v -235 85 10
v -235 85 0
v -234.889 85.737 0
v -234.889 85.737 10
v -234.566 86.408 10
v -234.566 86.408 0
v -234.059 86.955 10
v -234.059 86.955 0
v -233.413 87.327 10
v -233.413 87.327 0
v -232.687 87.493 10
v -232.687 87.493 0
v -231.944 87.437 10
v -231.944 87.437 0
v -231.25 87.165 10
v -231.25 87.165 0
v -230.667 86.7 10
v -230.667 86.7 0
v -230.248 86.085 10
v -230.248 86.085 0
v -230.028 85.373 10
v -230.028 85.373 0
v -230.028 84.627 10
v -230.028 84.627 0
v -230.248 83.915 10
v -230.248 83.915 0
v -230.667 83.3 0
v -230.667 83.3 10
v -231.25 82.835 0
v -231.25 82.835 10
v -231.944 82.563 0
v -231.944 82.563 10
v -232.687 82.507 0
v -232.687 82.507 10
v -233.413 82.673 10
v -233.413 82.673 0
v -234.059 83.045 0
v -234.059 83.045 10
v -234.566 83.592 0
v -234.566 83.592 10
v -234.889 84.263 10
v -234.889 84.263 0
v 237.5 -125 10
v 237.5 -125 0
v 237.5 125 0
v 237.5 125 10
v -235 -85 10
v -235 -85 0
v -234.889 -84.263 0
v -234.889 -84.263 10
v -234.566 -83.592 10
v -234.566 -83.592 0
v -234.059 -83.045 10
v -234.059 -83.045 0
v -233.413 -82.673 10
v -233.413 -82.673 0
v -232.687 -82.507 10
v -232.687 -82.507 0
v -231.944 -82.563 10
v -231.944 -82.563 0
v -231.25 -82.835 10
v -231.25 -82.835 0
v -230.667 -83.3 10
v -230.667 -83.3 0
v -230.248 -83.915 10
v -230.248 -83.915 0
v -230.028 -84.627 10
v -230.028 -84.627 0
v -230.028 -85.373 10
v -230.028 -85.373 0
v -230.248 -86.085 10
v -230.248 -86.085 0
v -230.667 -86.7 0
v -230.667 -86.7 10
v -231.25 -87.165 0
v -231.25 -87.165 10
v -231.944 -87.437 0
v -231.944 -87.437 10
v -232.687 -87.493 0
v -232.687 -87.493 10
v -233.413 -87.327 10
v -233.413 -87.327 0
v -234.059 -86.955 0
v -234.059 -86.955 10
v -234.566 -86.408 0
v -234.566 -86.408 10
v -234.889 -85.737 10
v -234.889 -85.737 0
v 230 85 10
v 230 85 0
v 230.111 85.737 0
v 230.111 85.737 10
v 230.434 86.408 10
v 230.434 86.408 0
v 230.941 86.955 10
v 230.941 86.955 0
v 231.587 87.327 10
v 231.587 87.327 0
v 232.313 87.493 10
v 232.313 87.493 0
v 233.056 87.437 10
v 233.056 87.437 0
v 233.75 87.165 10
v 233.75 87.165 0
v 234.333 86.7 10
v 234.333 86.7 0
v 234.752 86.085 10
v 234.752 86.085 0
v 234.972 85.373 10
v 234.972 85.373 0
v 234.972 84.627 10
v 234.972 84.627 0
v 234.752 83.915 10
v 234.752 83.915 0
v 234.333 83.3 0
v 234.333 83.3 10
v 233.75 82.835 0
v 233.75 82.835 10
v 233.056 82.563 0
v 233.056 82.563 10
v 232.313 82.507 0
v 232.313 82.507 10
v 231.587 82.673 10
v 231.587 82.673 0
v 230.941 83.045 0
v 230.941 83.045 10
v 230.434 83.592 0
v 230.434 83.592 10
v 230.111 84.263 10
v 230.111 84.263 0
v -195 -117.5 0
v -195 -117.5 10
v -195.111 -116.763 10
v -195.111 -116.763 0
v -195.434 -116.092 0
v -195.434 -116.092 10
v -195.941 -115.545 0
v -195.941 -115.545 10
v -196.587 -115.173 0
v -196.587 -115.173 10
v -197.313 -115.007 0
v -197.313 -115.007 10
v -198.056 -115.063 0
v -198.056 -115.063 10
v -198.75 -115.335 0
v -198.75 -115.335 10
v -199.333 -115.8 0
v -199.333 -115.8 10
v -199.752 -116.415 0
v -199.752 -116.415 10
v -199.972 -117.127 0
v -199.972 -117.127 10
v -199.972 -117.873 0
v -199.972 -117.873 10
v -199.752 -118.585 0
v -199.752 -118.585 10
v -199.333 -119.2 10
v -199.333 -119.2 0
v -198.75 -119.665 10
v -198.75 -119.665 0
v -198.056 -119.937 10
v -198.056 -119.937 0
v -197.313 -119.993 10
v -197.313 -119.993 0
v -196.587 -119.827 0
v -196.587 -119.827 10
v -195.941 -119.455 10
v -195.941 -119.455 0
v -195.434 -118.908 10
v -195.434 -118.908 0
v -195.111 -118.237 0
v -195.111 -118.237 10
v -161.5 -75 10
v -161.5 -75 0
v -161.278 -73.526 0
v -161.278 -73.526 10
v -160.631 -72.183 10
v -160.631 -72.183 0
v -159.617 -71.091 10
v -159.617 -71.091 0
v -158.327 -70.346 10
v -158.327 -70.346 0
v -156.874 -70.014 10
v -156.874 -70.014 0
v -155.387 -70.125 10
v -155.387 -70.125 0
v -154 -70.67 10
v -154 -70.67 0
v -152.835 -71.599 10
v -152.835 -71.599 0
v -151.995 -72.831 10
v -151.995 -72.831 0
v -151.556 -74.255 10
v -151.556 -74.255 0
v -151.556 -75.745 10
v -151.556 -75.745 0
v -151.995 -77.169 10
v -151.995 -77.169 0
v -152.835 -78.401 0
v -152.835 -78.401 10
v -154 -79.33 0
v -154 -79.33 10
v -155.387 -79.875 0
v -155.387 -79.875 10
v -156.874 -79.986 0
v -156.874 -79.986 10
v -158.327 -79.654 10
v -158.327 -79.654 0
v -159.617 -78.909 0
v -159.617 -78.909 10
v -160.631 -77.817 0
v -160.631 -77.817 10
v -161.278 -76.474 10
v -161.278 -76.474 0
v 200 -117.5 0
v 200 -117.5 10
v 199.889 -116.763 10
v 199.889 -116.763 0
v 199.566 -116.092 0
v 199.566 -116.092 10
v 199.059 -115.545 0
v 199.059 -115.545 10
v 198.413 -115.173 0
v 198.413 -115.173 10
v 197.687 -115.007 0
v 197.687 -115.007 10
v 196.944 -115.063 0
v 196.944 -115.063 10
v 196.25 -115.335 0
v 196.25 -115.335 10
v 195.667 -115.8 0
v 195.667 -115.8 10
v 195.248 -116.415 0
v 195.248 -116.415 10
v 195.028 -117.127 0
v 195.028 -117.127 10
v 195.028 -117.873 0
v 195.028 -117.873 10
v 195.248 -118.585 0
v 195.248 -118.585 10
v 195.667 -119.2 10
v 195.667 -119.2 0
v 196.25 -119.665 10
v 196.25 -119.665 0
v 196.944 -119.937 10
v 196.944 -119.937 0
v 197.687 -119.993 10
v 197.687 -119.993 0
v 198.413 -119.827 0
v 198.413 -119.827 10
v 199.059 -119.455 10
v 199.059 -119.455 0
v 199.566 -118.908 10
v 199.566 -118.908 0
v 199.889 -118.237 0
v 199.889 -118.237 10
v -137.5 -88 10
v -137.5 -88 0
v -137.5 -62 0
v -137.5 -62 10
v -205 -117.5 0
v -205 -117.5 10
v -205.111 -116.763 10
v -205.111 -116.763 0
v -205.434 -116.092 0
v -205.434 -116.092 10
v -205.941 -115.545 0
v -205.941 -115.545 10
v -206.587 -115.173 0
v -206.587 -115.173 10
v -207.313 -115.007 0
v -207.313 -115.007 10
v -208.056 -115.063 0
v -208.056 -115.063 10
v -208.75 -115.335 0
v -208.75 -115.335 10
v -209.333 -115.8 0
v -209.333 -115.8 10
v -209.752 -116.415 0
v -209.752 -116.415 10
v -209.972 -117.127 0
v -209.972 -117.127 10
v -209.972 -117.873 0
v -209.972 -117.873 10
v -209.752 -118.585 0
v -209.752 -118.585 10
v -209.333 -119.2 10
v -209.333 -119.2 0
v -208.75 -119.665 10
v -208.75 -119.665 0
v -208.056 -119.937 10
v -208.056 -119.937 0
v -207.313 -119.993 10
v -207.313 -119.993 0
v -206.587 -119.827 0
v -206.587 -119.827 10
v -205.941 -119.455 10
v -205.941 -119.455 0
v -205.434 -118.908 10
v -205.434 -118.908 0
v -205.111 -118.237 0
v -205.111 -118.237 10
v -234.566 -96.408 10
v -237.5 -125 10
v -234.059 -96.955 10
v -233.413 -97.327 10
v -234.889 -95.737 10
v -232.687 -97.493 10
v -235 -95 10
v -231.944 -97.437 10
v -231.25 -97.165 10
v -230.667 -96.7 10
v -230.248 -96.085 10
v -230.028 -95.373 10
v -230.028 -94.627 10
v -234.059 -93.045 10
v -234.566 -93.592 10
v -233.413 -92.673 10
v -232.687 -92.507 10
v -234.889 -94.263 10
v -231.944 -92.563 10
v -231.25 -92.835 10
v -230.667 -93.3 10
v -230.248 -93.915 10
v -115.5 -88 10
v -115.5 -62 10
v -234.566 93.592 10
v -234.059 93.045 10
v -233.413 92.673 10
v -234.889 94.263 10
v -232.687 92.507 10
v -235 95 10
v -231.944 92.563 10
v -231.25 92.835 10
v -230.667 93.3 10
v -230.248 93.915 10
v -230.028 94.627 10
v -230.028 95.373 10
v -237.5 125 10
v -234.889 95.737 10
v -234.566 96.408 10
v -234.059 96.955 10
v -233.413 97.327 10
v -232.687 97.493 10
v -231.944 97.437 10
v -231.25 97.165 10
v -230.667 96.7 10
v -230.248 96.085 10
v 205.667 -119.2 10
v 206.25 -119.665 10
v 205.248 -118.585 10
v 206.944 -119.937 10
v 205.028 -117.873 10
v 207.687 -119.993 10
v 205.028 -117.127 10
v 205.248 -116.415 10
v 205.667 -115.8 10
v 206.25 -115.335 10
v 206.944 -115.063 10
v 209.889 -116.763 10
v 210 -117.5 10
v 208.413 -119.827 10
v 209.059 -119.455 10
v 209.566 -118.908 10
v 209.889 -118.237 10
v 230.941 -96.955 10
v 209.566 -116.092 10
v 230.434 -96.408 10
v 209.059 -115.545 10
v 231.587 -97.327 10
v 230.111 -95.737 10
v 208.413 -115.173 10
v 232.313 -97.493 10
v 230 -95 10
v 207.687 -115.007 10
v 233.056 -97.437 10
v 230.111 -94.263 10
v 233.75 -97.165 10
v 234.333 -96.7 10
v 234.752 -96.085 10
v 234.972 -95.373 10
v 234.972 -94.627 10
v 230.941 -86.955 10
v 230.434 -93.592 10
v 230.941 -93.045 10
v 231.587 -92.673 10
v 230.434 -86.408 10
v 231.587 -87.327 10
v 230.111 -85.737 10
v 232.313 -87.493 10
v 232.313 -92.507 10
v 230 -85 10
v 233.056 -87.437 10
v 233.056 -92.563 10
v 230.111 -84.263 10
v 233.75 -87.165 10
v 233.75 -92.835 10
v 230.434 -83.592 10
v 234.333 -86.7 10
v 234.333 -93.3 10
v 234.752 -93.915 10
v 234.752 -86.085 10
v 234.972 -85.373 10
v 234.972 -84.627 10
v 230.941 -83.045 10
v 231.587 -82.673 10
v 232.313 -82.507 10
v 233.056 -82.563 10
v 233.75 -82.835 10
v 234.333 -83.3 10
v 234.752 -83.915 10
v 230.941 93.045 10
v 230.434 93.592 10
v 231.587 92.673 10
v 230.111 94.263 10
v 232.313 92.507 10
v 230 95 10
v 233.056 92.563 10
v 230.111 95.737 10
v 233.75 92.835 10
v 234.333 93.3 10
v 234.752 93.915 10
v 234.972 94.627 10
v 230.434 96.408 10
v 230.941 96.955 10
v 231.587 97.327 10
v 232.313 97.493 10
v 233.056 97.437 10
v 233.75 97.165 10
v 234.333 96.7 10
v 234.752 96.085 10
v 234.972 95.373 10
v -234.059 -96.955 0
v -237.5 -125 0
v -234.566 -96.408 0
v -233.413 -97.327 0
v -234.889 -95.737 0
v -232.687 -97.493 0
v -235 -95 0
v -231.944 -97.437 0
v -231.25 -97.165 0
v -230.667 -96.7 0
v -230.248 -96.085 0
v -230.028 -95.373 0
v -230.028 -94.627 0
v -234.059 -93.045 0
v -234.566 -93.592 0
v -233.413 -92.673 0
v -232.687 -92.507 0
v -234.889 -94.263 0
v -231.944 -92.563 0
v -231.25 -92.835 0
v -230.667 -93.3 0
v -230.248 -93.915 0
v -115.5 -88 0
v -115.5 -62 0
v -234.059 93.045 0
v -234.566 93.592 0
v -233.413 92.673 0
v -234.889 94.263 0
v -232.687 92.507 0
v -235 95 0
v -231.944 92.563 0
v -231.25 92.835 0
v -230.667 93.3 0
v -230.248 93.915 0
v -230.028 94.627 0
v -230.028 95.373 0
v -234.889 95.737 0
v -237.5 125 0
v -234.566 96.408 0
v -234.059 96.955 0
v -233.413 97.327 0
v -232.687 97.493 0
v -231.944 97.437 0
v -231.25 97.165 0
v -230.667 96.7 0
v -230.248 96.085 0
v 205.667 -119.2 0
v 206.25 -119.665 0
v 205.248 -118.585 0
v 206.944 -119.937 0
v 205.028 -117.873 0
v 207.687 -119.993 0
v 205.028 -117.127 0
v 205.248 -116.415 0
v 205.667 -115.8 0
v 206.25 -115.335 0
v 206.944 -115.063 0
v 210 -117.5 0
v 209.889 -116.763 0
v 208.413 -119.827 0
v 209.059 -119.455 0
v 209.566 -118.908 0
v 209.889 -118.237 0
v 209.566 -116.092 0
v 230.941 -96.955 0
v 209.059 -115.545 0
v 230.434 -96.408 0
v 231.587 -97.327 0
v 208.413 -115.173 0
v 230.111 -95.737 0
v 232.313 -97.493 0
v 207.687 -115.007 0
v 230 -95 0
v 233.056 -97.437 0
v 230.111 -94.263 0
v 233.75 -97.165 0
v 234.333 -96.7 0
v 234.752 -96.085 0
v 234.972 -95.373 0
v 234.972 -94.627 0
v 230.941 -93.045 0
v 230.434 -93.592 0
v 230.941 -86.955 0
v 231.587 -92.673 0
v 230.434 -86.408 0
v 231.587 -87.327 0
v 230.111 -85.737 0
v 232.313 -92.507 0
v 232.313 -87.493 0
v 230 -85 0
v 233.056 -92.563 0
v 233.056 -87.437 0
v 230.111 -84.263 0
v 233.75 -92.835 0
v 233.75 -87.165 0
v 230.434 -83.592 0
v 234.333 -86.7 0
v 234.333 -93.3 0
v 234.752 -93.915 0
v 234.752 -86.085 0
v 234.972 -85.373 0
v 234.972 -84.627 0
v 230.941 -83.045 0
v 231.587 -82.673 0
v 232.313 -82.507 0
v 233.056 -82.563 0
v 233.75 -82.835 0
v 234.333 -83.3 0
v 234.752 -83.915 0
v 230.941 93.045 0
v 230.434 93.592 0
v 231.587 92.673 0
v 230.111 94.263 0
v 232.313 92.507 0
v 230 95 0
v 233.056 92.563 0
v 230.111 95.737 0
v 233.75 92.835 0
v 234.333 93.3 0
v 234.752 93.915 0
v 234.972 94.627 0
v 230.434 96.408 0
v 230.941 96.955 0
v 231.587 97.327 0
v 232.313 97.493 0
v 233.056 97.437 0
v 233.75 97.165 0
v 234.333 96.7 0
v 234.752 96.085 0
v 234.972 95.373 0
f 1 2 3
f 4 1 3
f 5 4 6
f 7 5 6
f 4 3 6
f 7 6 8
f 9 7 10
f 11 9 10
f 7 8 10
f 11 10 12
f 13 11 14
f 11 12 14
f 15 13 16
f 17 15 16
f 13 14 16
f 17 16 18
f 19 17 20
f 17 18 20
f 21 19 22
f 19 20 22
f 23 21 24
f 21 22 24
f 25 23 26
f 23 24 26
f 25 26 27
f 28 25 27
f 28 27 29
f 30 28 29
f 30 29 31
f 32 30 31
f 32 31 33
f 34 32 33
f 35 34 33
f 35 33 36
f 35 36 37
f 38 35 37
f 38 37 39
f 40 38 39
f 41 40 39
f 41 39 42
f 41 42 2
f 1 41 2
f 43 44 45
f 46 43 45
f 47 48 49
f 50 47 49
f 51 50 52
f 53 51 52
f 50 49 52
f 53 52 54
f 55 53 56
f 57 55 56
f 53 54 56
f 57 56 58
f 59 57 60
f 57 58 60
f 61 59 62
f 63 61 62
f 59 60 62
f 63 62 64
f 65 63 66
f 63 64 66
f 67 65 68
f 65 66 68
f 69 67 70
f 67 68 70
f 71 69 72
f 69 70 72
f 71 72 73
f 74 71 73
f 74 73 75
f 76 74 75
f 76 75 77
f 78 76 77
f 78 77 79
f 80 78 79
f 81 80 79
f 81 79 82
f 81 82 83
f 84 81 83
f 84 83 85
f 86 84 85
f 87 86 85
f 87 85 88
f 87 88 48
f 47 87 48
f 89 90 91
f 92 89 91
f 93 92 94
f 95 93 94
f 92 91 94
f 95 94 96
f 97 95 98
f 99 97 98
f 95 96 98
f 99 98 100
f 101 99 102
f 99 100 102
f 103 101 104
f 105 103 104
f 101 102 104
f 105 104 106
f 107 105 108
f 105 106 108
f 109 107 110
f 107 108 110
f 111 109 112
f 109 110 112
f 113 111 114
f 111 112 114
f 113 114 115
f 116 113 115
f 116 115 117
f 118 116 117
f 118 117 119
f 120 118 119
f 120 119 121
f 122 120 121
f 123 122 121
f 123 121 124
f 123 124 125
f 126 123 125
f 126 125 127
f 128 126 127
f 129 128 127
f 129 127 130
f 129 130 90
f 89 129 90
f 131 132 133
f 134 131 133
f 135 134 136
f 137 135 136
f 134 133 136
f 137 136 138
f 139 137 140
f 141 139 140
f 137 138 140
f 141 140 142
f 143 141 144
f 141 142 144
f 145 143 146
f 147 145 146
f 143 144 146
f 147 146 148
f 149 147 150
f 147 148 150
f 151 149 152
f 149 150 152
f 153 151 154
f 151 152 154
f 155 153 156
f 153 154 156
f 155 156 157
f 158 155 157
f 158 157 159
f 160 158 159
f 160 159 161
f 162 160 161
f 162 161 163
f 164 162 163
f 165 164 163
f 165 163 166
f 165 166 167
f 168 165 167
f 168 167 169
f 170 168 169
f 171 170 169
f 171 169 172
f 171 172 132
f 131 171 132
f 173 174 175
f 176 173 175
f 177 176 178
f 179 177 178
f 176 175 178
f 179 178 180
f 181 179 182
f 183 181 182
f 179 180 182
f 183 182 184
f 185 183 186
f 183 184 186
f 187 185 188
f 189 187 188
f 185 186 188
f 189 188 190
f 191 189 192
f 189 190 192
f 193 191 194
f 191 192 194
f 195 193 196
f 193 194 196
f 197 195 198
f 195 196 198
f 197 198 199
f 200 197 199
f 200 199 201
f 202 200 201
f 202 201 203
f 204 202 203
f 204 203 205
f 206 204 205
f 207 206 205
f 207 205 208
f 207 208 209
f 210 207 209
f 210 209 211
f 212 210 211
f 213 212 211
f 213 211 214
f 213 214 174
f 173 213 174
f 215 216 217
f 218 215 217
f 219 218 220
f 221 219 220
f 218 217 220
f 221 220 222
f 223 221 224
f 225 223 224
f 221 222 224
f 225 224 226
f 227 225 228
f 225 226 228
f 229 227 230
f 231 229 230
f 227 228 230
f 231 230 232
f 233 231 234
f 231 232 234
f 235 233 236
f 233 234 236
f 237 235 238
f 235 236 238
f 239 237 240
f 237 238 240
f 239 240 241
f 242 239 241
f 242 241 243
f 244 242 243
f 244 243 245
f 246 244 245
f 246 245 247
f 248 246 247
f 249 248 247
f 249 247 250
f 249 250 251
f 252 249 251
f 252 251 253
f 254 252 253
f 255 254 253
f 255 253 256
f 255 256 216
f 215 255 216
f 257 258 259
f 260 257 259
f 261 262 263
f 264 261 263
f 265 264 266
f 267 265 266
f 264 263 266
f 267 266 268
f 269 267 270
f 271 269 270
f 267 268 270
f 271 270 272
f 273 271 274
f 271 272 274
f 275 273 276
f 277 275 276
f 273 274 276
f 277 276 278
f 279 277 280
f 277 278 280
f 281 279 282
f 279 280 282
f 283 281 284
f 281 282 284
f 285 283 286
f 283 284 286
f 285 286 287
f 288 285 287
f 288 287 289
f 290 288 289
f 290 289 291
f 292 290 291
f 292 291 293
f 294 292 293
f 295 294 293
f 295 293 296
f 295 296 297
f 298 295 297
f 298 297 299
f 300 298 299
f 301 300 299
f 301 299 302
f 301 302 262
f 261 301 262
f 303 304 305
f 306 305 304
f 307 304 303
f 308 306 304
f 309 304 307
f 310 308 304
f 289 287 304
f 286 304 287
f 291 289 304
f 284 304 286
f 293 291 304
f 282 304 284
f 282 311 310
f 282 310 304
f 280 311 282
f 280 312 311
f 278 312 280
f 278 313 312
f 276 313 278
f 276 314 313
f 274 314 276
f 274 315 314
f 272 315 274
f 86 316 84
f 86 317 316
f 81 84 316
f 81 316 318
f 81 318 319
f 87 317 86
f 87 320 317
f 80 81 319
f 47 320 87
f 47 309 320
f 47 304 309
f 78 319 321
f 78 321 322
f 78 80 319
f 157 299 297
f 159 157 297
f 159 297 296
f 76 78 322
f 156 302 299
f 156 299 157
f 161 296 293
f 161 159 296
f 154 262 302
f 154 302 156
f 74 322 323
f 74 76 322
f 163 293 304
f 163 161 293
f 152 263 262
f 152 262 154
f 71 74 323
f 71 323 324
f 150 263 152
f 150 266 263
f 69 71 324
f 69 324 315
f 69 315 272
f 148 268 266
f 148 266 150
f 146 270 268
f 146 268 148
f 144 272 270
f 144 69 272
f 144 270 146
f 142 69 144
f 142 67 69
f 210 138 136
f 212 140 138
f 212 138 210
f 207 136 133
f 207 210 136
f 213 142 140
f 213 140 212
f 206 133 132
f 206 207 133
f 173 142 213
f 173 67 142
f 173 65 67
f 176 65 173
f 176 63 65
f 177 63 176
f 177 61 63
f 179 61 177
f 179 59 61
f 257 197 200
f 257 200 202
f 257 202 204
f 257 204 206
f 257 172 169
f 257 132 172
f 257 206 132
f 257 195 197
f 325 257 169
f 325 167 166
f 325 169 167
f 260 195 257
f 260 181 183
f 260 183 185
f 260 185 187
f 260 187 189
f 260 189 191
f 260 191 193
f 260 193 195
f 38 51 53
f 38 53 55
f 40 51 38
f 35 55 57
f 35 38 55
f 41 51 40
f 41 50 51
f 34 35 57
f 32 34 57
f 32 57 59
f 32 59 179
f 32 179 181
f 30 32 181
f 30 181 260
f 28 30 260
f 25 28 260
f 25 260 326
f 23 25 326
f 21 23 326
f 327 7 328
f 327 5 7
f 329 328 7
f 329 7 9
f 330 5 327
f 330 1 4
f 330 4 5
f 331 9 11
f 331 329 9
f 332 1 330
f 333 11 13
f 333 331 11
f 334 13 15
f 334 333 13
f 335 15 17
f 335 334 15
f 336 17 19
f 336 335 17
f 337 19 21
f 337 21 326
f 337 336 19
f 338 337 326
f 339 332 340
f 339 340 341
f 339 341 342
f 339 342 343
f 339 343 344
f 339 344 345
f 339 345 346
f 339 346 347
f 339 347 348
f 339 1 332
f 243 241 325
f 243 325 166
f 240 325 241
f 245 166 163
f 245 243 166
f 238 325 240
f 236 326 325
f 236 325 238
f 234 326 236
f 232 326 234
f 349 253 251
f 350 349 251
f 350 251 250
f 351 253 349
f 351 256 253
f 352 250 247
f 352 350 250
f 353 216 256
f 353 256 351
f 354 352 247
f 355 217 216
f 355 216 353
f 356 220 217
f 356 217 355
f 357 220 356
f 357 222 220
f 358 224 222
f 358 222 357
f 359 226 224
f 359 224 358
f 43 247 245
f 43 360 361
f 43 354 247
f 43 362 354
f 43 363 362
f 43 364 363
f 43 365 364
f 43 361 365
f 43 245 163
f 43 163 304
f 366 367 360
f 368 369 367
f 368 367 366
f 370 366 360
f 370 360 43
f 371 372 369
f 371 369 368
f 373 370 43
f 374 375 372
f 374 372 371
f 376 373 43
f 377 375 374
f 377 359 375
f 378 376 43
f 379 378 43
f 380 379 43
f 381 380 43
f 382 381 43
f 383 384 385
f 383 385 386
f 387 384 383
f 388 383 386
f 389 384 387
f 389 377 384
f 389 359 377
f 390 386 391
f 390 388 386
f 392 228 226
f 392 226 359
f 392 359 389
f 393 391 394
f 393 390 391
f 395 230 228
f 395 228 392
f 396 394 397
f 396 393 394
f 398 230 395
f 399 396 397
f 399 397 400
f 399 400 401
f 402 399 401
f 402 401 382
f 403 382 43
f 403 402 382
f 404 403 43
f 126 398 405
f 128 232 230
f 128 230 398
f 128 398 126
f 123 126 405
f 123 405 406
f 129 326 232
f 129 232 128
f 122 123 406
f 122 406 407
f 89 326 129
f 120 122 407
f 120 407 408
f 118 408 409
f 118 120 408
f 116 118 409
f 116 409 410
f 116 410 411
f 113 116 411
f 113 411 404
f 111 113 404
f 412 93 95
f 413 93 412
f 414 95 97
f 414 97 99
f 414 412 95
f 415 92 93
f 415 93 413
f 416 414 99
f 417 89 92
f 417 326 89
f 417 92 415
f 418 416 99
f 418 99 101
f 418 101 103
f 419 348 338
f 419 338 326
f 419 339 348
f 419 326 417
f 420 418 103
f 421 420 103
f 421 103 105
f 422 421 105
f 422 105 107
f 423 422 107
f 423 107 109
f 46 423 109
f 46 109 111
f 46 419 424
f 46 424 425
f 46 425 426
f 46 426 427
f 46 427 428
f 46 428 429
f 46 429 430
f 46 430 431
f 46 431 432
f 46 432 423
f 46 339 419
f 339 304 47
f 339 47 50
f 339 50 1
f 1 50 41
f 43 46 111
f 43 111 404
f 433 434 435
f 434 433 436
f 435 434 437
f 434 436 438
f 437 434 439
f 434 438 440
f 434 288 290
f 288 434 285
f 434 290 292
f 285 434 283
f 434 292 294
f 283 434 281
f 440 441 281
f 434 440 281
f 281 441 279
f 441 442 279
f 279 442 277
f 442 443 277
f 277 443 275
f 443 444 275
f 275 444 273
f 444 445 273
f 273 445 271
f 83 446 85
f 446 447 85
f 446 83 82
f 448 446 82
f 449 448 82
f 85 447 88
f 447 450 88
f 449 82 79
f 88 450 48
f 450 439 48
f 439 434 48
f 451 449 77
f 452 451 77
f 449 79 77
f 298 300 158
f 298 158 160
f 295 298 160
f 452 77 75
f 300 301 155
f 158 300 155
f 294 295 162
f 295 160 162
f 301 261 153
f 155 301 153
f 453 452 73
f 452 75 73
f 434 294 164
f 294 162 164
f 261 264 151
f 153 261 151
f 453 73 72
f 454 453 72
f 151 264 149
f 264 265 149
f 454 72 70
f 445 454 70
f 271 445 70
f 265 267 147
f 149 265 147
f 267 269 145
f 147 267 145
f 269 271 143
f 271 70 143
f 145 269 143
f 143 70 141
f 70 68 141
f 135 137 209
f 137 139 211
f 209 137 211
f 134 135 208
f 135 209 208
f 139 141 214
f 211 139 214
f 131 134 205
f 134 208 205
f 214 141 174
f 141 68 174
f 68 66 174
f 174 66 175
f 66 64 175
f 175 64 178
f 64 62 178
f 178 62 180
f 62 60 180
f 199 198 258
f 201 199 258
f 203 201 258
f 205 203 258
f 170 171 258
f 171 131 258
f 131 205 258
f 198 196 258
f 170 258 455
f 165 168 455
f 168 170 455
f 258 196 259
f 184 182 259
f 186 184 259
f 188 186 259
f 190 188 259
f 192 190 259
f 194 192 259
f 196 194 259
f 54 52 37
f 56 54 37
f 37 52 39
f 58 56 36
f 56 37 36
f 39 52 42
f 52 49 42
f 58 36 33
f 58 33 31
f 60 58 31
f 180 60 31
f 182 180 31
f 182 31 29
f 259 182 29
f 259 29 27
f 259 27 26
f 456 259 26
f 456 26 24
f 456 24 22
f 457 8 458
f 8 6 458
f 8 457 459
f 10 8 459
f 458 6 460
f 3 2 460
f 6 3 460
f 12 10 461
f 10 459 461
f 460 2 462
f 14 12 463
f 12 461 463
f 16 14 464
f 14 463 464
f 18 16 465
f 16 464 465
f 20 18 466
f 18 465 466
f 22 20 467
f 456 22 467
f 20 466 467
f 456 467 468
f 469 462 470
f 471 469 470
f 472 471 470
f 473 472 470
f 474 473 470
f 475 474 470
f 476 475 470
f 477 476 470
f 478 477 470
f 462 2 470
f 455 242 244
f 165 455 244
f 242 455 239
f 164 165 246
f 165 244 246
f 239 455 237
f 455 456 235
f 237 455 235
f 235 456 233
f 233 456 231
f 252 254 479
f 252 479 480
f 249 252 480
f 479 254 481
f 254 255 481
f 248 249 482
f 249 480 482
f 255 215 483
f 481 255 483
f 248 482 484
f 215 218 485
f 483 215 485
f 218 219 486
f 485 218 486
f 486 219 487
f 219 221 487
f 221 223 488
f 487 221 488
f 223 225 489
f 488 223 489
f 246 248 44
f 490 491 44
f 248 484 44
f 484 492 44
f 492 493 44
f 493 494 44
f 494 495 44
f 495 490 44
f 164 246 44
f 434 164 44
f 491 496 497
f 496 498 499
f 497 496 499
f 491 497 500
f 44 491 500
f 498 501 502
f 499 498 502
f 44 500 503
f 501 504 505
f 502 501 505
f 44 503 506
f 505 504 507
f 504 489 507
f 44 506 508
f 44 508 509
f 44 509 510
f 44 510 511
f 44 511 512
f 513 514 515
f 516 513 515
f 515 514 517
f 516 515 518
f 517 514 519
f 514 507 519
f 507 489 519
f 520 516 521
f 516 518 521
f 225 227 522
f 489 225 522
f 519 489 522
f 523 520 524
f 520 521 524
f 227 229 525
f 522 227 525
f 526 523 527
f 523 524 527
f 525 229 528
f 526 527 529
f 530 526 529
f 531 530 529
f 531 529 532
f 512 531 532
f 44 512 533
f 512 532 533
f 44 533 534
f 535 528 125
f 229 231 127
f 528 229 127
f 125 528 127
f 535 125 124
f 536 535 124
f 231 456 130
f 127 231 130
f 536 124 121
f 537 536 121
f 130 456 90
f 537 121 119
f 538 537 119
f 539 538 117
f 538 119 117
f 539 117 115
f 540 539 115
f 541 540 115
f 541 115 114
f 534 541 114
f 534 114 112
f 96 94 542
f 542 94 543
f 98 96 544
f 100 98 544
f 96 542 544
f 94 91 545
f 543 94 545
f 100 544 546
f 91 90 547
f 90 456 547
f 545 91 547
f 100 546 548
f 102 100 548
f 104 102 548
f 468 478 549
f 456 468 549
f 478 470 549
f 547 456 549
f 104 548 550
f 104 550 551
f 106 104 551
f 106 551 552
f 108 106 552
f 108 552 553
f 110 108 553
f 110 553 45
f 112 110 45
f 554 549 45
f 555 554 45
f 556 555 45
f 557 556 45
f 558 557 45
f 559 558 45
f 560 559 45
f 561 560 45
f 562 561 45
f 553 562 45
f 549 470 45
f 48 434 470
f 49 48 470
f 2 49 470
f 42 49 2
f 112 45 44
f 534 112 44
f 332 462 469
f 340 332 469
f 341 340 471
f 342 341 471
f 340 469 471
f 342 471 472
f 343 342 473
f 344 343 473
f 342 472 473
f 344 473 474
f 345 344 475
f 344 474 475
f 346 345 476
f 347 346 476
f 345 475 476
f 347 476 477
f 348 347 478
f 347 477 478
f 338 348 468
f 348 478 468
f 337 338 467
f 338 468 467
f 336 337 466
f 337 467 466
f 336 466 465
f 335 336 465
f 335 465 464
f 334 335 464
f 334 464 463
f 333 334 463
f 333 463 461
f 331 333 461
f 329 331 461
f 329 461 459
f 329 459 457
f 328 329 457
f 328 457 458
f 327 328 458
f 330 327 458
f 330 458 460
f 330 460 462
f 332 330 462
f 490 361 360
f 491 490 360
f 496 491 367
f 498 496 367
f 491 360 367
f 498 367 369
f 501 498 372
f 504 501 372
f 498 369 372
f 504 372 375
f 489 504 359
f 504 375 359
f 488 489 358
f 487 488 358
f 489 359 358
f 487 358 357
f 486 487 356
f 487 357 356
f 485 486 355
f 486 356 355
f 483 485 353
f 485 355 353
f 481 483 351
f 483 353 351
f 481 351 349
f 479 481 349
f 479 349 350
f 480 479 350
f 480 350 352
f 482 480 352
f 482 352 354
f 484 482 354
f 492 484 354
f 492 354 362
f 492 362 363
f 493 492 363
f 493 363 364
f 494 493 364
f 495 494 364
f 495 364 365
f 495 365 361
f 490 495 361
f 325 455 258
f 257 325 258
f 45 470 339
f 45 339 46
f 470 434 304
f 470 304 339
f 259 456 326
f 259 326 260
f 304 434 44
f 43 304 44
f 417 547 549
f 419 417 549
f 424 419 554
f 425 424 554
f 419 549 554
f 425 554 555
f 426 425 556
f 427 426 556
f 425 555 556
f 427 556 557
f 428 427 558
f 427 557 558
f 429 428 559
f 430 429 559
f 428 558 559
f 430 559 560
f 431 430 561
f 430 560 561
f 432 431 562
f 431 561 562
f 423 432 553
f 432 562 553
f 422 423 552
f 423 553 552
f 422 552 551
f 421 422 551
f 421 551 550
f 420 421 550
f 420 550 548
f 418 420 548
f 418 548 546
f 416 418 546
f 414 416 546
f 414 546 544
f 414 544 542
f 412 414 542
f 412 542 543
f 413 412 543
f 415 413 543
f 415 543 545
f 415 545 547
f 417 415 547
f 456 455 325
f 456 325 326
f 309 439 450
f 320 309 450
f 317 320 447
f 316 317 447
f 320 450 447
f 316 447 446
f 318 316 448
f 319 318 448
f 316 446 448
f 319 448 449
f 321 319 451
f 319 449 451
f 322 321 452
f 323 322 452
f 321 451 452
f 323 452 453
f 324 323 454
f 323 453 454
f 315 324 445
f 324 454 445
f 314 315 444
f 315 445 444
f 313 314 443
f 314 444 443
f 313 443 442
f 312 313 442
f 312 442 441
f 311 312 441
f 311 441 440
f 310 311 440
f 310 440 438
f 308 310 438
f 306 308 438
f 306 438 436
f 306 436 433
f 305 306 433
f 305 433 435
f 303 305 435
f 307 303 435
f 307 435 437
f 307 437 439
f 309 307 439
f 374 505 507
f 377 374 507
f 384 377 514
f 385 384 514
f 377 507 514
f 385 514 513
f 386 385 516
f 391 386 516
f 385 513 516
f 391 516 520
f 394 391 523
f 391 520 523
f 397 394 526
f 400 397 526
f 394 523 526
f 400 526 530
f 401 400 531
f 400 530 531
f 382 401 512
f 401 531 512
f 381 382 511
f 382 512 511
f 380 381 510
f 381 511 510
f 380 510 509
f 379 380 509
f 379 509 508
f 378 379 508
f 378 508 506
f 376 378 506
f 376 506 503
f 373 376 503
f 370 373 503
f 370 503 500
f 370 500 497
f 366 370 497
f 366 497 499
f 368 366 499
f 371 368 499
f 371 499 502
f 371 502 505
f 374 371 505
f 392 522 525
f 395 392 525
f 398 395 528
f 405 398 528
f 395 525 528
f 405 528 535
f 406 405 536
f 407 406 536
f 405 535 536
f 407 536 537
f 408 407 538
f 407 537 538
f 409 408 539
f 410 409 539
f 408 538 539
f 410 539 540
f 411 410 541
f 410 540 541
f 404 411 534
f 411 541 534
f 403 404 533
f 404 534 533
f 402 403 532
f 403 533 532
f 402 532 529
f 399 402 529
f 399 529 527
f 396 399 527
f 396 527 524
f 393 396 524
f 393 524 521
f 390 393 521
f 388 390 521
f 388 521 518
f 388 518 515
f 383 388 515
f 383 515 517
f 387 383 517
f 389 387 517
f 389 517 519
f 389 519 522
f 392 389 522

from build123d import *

# Parameters (mm, degrees)
SKETCH1_W           = 475
SKETCH1_H           = 250
BOSS_EXTRUDE1_DEPTH = 10
SKETCH2_R           = 2.5
CUT_EXTRUDE1_DEPTH  = 269.572615879
SKETCH3_R           = 2.5
CUT_EXTRUDE2_DEPTH  = 269.572615879
SKETCH4_R           = 5
SKETCH4_W           = 22
SKETCH4_H           = 26
CUT_EXTRUDE3_DEPTH  = 269.572615879


with BuildPart() as part:
    # Sketch1 → Boss-Extrude1 (new body)
    with BuildSketch(Plane.XY):
        Rectangle(SKETCH1_W, SKETCH1_H)
    extrude(amount=BOSS_EXTRUDE1_DEPTH)

    # Sketch2 → Cut-Extrude1 (cut, through all)
    with BuildSketch(Plane.XY.offset(10)):
        with Locations((-207.5, -117.5)):
            Circle(SKETCH2_R)
        with Locations((207.5, -117.5)):
            Circle(SKETCH2_R)
        with Locations((197.5, -117.5)):
            Circle(SKETCH2_R)
        with Locations((-197.5, -117.5)):
            Circle(SKETCH2_R)
    extrude(amount=-CUT_EXTRUDE1_DEPTH, mode=Mode.SUBTRACT)

    # Sketch3 → Cut-Extrude2 (cut, through all)
    with BuildSketch(Plane(origin=(0, 0, 0), x_dir=(-1, 0, 0), z_dir=(0, 0, -1))):
        with Locations((232.5, 95)):
            Circle(SKETCH3_R)
        with Locations((232.5, 85)):
            Circle(SKETCH3_R)
        with Locations((232.5, -85)):
            Circle(SKETCH3_R)
        with Locations((232.5, -95)):
            Circle(SKETCH3_R)
        with Locations((-232.5, 95)):
            Circle(SKETCH3_R)
        with Locations((-232.5, 85)):
            Circle(SKETCH3_R)
        with Locations((-232.5, -85)):
            Circle(SKETCH3_R)
        with Locations((-232.5, -95)):
            Circle(SKETCH3_R)
    extrude(amount=-CUT_EXTRUDE2_DEPTH, mode=Mode.SUBTRACT)

    # Sketch4 → Cut-Extrude3 (cut, through all)
    with BuildSketch(Plane(origin=(0, 0, 0), x_dir=(-1, 0, 0), z_dir=(0, 0, -1))):
        with Locations((156.5, -75)):
            Circle(SKETCH4_R)
        with Locations((126.5, -75)):
            Rectangle(SKETCH4_W, SKETCH4_H)
    extrude(amount=-CUT_EXTRUDE3_DEPTH, mode=Mode.SUBTRACT)


solid = part.part
